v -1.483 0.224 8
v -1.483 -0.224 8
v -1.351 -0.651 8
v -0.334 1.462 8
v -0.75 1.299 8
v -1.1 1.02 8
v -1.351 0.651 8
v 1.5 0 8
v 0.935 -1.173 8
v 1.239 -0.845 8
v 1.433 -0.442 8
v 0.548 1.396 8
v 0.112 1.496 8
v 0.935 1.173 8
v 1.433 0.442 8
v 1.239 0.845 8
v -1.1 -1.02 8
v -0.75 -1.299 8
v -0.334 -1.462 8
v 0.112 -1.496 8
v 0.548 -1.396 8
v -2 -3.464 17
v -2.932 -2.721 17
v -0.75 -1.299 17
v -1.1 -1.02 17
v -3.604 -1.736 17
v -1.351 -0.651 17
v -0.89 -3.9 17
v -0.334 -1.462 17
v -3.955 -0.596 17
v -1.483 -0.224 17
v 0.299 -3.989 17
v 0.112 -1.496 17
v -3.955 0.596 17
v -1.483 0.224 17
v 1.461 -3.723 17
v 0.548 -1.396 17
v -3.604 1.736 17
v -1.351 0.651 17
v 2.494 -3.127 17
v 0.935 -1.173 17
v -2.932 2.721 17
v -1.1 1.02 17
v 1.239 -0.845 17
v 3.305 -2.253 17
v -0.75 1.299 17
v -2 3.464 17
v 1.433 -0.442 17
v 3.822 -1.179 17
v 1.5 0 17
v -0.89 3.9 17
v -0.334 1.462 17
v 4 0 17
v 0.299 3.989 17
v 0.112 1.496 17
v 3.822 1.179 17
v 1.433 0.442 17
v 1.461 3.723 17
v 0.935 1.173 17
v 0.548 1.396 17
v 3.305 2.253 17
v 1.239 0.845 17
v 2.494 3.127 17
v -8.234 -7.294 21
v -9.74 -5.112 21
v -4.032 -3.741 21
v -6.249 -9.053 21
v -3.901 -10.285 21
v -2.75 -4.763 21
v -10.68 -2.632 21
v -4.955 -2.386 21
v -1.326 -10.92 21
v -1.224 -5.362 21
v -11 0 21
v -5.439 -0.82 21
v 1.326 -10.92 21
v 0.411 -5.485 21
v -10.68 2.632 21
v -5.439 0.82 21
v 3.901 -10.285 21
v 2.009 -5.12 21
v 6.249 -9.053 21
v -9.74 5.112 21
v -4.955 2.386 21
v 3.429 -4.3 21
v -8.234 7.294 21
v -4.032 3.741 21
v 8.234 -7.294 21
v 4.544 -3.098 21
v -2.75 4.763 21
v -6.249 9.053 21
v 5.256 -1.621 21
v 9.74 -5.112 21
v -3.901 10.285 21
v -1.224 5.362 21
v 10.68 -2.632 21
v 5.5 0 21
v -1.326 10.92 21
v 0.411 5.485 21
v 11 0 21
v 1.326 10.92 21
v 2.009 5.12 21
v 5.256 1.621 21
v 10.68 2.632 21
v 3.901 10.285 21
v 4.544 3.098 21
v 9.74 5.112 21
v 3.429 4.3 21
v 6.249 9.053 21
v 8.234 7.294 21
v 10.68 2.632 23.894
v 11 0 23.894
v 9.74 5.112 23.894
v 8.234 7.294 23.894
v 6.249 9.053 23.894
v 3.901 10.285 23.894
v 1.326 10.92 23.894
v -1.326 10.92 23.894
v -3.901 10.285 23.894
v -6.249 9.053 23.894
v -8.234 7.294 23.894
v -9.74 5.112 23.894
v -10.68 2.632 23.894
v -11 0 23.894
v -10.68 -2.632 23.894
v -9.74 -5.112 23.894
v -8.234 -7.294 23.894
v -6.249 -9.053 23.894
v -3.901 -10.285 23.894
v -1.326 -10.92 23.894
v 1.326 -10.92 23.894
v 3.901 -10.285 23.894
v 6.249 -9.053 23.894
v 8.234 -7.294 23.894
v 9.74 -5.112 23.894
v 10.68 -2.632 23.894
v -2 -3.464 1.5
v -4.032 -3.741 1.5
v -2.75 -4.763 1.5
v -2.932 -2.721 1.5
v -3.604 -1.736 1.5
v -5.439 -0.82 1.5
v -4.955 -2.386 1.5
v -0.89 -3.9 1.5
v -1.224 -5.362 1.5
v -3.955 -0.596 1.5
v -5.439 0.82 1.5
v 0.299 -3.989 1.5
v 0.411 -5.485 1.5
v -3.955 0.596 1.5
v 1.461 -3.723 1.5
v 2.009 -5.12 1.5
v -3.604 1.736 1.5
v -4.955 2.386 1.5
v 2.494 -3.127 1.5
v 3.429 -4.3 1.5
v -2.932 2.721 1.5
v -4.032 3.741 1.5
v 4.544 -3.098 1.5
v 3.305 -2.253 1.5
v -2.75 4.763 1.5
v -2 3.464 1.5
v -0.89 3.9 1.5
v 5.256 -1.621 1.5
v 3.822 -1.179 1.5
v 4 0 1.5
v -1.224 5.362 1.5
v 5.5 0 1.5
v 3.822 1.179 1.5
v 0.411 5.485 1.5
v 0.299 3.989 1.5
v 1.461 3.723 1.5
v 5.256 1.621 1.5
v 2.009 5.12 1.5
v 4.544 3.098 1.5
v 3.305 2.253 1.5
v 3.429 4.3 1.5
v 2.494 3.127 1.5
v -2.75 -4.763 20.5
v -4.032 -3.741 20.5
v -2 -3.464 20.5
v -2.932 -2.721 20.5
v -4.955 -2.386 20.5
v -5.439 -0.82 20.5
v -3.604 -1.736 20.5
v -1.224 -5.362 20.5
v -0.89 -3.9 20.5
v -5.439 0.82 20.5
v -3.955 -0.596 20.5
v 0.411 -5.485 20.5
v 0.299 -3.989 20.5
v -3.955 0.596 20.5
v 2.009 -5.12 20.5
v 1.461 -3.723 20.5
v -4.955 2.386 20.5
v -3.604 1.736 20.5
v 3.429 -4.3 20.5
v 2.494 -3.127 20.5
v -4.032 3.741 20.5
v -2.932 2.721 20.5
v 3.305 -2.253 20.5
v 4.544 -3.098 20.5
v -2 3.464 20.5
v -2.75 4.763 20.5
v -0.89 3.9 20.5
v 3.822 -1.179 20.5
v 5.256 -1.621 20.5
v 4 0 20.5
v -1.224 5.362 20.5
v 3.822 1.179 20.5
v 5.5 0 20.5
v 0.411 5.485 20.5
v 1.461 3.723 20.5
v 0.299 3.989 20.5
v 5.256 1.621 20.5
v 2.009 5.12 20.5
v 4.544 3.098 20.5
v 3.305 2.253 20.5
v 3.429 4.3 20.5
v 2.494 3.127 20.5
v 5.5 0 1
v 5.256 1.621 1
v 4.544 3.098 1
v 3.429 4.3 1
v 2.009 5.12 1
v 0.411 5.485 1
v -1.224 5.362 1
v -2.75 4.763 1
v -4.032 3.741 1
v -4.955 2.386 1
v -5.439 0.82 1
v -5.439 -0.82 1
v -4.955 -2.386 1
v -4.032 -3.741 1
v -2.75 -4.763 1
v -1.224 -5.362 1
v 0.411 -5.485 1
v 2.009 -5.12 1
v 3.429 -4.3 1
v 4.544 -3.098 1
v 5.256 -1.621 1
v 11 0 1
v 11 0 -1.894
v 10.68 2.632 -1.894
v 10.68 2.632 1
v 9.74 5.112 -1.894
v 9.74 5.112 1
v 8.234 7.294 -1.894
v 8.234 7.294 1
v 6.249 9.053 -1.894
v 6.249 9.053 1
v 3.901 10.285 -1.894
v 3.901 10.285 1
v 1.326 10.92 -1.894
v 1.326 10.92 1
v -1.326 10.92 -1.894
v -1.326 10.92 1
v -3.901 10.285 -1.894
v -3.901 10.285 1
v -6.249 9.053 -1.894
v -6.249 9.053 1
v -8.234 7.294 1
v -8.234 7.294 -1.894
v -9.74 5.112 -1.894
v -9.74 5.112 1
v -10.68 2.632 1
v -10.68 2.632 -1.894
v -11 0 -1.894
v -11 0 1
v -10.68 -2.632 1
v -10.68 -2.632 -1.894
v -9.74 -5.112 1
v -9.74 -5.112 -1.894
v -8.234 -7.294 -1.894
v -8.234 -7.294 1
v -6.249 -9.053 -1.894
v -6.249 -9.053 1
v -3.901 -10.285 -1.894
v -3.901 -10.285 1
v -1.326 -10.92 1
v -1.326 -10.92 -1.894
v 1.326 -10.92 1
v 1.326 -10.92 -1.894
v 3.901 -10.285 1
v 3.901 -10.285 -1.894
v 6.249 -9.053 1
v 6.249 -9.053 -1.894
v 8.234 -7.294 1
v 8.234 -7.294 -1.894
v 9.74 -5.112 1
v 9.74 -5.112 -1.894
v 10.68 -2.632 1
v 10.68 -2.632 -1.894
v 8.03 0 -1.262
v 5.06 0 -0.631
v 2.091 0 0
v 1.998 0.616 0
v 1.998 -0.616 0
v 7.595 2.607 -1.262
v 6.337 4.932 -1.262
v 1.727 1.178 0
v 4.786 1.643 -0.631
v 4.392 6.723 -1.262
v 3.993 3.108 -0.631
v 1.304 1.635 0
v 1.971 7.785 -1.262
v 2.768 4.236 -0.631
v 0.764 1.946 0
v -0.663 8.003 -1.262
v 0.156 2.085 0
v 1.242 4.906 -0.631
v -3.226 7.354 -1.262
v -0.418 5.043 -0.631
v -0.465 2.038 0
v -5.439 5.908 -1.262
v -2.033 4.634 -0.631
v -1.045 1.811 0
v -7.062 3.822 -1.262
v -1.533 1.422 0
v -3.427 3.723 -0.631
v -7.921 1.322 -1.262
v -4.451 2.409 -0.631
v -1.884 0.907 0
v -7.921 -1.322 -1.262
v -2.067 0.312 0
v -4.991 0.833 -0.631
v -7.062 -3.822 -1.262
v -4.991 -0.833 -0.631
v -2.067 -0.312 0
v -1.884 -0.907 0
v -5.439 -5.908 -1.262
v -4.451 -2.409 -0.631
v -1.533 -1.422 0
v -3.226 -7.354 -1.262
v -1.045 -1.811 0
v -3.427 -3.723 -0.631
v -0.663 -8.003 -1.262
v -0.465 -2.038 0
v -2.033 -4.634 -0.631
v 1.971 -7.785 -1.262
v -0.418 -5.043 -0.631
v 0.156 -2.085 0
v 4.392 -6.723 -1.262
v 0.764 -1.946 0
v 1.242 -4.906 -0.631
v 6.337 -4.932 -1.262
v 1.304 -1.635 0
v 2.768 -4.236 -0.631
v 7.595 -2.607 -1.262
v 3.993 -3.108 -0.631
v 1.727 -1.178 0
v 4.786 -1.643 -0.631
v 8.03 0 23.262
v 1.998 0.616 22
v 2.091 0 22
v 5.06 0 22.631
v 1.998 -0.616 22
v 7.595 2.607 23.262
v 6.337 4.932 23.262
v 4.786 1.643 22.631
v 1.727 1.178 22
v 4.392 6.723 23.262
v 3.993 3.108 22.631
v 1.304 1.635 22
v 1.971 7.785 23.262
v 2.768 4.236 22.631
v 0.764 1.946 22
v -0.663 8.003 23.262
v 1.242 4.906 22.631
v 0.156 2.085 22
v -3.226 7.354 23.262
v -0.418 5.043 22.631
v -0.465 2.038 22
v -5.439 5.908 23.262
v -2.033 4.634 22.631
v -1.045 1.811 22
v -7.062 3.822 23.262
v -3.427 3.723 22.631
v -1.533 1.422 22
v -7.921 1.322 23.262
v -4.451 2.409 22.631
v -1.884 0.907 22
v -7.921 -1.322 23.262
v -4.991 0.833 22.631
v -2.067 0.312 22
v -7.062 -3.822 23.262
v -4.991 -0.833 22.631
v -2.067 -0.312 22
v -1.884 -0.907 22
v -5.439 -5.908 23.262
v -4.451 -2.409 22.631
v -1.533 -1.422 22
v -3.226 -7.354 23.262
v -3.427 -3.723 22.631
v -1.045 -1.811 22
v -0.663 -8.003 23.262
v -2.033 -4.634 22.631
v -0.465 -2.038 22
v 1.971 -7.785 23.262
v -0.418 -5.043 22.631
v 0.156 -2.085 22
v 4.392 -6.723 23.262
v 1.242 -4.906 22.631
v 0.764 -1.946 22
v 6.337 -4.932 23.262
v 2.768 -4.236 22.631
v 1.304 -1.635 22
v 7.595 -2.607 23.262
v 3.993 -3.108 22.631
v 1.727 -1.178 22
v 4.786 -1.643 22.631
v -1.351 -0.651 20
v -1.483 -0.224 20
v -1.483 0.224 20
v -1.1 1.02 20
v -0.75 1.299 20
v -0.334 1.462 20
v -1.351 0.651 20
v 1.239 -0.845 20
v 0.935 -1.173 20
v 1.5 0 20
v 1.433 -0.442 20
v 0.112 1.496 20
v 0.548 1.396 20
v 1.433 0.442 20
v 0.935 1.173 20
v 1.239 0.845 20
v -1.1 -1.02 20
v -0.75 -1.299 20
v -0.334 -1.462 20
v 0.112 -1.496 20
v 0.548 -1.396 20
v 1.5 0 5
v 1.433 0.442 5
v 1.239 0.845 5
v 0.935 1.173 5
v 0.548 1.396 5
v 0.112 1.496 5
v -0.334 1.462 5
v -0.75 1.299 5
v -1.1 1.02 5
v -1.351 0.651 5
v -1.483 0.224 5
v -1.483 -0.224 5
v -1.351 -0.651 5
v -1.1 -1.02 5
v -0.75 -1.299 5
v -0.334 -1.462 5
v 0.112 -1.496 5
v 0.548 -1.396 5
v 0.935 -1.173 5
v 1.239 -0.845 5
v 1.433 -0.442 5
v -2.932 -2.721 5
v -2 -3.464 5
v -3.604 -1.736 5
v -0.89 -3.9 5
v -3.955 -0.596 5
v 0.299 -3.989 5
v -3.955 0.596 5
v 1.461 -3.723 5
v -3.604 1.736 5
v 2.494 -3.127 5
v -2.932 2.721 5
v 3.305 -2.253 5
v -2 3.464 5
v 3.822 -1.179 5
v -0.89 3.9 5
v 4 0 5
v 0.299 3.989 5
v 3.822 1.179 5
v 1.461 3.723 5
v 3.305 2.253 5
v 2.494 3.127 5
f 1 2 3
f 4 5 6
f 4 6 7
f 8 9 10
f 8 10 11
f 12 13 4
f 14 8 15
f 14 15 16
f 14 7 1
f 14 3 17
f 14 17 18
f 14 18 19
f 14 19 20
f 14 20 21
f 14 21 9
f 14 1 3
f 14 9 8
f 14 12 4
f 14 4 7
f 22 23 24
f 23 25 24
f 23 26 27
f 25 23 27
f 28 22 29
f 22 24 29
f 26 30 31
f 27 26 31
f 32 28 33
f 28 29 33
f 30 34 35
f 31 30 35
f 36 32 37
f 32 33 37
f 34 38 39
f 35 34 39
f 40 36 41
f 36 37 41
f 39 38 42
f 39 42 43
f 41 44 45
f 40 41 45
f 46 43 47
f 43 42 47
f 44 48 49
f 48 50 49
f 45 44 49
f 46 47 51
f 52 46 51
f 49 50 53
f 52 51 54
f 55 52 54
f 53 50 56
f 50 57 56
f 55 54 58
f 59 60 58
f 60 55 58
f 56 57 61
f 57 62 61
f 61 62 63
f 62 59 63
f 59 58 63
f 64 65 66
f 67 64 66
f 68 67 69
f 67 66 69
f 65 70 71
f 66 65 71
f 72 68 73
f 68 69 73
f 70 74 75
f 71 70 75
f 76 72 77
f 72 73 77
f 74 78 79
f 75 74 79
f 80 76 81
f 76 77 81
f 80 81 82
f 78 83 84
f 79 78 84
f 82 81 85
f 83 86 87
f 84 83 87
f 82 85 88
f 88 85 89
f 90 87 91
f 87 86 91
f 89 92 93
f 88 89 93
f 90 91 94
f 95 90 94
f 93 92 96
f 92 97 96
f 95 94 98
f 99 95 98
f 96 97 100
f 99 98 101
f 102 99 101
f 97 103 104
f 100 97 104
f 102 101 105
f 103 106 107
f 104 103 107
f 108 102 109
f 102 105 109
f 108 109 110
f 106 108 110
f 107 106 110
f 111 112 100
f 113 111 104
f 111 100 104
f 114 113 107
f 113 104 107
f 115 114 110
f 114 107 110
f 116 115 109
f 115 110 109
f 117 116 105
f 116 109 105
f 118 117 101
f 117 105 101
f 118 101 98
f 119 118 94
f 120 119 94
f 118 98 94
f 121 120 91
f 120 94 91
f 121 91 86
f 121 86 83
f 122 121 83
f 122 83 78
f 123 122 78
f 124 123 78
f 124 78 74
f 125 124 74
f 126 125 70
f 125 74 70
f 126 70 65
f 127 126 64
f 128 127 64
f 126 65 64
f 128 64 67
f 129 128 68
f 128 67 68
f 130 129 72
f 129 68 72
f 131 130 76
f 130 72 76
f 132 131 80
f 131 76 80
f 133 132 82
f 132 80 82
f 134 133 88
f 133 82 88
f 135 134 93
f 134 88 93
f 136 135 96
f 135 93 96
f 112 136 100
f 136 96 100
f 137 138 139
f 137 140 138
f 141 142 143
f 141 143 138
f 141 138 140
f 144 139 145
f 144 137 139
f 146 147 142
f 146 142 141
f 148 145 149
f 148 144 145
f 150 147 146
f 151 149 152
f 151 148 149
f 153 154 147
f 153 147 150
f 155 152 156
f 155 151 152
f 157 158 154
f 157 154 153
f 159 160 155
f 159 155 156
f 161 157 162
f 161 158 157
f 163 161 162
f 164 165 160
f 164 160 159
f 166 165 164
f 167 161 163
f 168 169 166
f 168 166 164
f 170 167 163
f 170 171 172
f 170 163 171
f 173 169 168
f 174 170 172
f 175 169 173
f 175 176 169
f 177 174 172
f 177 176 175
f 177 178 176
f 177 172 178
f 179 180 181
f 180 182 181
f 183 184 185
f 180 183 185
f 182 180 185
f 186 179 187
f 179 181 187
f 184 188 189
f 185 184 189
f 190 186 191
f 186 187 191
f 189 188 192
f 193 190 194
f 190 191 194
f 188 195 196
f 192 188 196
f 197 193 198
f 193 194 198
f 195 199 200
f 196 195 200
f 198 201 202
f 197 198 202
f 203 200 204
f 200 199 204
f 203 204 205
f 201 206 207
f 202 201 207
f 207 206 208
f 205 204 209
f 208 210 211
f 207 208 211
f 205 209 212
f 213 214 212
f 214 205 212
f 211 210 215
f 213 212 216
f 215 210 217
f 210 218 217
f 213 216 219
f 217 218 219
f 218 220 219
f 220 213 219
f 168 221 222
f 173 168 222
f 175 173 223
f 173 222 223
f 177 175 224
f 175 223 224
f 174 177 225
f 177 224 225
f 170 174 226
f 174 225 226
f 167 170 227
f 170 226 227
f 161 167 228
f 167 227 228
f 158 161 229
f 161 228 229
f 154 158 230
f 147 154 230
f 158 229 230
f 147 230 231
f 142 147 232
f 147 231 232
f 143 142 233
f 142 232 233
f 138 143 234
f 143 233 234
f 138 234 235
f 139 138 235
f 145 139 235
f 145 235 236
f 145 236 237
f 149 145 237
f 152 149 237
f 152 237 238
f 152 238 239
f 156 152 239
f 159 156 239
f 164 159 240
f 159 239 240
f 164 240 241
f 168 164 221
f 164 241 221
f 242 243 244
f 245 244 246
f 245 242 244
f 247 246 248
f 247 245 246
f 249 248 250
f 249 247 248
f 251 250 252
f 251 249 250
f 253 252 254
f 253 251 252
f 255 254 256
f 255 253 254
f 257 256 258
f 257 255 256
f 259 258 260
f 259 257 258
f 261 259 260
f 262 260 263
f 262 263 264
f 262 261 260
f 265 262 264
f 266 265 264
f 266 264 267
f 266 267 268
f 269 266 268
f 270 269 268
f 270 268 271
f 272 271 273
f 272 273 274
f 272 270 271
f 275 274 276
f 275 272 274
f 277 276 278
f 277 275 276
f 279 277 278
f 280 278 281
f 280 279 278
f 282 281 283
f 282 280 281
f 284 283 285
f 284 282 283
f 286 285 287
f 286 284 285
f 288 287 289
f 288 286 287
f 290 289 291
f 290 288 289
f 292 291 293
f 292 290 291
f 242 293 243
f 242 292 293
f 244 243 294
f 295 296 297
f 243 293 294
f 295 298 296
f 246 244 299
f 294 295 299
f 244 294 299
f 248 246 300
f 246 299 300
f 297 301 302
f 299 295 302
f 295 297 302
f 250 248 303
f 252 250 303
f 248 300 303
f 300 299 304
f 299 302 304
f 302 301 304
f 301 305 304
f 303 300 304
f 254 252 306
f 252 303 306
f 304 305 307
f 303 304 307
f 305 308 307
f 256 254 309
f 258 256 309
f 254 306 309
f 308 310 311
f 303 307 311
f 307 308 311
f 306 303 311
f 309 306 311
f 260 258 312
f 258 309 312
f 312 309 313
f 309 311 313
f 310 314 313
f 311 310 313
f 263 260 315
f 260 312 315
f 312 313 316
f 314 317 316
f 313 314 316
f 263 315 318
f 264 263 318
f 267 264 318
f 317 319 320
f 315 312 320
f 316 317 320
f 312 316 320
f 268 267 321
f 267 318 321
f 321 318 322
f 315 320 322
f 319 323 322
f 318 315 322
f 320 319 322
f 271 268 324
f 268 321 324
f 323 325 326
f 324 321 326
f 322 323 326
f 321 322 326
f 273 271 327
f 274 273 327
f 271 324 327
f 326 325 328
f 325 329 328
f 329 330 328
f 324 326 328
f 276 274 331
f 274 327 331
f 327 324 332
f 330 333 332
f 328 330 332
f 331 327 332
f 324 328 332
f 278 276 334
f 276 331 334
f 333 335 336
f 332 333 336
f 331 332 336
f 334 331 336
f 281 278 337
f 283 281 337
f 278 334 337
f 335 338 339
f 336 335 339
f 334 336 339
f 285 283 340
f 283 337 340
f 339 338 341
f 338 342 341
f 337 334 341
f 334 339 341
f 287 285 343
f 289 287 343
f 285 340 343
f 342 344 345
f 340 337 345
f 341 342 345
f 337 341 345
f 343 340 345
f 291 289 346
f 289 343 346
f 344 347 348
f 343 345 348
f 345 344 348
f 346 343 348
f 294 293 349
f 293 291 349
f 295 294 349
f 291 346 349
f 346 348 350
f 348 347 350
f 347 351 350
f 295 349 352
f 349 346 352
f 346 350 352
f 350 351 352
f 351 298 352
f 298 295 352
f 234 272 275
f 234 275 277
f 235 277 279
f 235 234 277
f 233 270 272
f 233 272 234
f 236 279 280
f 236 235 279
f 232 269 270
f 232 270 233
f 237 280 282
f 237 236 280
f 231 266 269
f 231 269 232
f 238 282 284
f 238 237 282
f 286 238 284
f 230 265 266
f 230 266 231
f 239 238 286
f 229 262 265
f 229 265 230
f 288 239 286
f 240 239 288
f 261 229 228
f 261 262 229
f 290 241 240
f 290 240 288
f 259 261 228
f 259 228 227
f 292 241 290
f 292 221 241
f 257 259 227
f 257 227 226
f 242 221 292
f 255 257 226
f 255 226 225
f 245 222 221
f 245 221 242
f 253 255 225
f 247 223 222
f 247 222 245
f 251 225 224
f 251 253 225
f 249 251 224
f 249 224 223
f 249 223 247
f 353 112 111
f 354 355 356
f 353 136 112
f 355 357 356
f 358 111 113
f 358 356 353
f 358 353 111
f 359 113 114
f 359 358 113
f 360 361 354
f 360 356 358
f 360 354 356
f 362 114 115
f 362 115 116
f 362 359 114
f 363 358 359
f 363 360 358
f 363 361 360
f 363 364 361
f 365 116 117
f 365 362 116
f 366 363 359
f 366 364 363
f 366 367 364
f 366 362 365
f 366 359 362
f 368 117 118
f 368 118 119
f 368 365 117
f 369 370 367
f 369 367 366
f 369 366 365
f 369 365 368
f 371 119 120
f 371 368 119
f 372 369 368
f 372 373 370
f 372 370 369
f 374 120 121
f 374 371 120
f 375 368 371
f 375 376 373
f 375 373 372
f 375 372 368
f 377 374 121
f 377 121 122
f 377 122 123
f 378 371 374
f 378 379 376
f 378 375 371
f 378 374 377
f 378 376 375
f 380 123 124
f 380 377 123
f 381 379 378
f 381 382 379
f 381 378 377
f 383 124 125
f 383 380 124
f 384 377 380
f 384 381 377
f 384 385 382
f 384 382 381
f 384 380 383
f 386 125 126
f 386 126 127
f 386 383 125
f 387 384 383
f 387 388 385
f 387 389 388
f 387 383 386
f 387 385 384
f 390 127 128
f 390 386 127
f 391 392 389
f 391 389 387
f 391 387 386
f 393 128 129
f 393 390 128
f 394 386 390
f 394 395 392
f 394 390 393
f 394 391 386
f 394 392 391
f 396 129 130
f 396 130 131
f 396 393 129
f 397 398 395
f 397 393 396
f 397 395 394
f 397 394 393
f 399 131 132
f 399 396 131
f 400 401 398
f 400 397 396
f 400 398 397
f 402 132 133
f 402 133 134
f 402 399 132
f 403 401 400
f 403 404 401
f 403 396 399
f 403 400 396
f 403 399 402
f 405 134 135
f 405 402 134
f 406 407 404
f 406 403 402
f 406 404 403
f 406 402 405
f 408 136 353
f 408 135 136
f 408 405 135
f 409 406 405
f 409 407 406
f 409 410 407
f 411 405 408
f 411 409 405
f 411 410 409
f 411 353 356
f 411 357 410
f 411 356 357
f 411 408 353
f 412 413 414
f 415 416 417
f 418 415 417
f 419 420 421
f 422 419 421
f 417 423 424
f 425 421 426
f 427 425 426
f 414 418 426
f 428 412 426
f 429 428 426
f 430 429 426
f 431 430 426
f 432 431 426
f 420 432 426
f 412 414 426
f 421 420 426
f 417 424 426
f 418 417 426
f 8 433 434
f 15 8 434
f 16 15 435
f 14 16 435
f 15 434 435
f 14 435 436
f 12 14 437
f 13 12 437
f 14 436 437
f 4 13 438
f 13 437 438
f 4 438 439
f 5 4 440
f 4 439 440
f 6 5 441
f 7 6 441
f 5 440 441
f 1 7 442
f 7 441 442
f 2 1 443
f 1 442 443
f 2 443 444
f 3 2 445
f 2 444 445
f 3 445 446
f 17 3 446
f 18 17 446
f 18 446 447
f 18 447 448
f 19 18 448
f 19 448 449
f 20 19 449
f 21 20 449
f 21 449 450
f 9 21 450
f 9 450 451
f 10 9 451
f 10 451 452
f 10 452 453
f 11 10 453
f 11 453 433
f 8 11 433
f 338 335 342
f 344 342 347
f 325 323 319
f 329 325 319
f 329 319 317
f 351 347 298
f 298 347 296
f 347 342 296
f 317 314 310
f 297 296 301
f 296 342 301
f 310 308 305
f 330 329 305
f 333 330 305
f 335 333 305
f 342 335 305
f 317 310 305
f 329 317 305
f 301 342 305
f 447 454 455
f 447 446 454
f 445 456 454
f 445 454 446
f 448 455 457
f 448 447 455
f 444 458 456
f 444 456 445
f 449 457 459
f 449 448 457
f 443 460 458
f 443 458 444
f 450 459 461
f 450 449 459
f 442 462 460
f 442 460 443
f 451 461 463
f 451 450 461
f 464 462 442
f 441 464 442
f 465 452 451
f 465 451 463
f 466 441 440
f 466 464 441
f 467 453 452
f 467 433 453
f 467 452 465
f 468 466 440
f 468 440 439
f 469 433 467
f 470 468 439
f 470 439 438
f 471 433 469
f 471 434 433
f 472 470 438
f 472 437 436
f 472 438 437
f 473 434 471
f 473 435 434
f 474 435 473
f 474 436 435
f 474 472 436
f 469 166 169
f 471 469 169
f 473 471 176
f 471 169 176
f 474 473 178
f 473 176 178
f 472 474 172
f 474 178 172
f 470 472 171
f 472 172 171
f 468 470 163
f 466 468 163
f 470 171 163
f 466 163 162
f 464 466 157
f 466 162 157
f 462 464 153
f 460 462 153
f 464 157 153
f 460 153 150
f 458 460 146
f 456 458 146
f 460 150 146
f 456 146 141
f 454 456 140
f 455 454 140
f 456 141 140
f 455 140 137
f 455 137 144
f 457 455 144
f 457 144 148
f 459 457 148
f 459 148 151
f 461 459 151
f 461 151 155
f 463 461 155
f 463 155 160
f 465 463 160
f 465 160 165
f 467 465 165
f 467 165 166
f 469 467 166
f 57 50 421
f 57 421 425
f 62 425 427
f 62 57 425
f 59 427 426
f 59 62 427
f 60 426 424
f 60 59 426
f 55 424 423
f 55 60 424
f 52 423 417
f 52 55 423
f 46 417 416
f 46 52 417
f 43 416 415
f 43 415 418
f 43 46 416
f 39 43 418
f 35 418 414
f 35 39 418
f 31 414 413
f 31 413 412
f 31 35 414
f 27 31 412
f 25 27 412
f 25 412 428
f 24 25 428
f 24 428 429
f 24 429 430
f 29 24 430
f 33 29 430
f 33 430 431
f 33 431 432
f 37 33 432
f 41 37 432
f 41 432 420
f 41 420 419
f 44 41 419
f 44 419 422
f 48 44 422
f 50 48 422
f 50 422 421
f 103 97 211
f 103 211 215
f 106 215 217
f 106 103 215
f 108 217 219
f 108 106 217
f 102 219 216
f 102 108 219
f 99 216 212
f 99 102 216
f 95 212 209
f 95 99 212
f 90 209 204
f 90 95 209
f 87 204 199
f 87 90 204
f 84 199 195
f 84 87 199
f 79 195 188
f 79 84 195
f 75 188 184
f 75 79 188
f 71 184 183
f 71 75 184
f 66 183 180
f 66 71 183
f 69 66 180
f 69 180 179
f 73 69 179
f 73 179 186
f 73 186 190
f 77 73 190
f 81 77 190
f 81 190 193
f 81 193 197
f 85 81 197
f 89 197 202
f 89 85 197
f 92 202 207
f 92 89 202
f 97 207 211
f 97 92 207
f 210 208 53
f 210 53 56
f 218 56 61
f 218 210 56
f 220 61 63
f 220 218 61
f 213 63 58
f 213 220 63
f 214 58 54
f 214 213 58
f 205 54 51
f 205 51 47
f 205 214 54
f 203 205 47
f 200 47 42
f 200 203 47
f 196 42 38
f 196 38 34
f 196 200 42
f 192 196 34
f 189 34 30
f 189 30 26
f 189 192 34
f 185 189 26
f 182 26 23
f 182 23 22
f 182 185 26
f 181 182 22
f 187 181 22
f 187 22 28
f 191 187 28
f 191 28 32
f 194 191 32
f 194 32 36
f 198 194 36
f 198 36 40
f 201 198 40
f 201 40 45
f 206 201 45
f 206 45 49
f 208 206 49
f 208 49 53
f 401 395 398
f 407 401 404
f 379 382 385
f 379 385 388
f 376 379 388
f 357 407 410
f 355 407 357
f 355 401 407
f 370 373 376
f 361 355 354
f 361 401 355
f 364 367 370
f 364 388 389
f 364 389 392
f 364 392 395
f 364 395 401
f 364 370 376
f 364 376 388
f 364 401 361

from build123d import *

# Parameters (mm, degrees)
F0_R     = 11
F0_R_2   = 5.5
F0_R_3   = 4
F0_R_4   = 1.5
F1_DEPTH = 1
F2_START = 1
F2_DEPTH = 0.5
F3_DEPTH = 5
F4_DEPTH = 8
F5_DEPTH = 2
F9_DEPTH = 6


# Not quite as in the source:
# - a fillet or chamfer that OpenCascade refuses, or shapes differently, is made with other operations: its cross-section is extruded or revolved along the edge and cut away or added


with BuildPart() as f1:
    # F0 (on Top) → F1 (new body)
    with BuildSketch(Plane.XY):
        Circle(F0_R)
        Circle(F0_R_2, mode=Mode.SUBTRACT)
        Circle(F0_R_2)
        Circle(F0_R_3, mode=Mode.SUBTRACT)
        Circle(F0_R_3)
        Circle(F0_R_4, mode=Mode.SUBTRACT)
        Circle(F0_R_4)
    extrude(amount=F1_DEPTH)

    # F0 (on Top) → F2 (join)
    with BuildSketch(Plane.XY.offset(F2_START)):
        Circle(F0_R_2)
        Circle(F0_R_3, mode=Mode.SUBTRACT)
    extrude(amount=F2_DEPTH)

    # F0 (on Top) → F3 (join)
    with BuildSketch(Plane.XY):
        Circle(F0_R_3)
        Circle(F0_R_4, mode=Mode.SUBTRACT)
    extrude(amount=F3_DEPTH)

    # F0 (on Top) → F4 (join)
    with BuildSketch(Plane.XY):
        Circle(F0_R_4)
    extrude(amount=F4_DEPTH)

    # F0 (on Top) → F5 (join)
    with BuildSketch(Plane.XY):
        Circle(F0_R)
        Circle(F0_R_2, mode=Mode.SUBTRACT)
        Circle(F0_R_2)
        Circle(F0_R_3, mode=Mode.SUBTRACT)
        Circle(F0_R_3)
        Circle(F0_R_4, mode=Mode.SUBTRACT)
    extrude(amount=-F5_DEPTH)

    # F6: chamfer of 10 x 2.1255656167 on 1 edges, made by hand


with BuildPart() as f6_tool2:
    # F6_s3 → F6_t4 (revolve)
    with BuildSketch(Plane.XZ):
        Polygon((11.5, -2), (1.5, 0.1255656167), (1.5, -2), align=None)
    revolve(axis=Axis((0, 0, -2), (0, 0, 1)))

    split(bisect_by=Plane.XY, keep=Keep.BOTTOM)


with BuildPart() as f1_1:
    add(f1.part)

    # F6_t1: cut F6_tool2
    add(f6_tool2.part, mode=Mode.SUBTRACT)


with BuildPart() as f8_1:
    # F8: instance of F1
    add(f1_1.part.mirror(Plane.XY.offset(11)))

    # F9 (cut): a face of the model
    f9_faces = [f8_1.faces().sort_by_distance(p)[0] for p in [
        (0, 0, 14),
    ]]
    extrude(f9_faces, amount=-F9_DEPTH, mode=Mode.SUBTRACT)


solid = Compound([f1_1.part, f8_1.part])
